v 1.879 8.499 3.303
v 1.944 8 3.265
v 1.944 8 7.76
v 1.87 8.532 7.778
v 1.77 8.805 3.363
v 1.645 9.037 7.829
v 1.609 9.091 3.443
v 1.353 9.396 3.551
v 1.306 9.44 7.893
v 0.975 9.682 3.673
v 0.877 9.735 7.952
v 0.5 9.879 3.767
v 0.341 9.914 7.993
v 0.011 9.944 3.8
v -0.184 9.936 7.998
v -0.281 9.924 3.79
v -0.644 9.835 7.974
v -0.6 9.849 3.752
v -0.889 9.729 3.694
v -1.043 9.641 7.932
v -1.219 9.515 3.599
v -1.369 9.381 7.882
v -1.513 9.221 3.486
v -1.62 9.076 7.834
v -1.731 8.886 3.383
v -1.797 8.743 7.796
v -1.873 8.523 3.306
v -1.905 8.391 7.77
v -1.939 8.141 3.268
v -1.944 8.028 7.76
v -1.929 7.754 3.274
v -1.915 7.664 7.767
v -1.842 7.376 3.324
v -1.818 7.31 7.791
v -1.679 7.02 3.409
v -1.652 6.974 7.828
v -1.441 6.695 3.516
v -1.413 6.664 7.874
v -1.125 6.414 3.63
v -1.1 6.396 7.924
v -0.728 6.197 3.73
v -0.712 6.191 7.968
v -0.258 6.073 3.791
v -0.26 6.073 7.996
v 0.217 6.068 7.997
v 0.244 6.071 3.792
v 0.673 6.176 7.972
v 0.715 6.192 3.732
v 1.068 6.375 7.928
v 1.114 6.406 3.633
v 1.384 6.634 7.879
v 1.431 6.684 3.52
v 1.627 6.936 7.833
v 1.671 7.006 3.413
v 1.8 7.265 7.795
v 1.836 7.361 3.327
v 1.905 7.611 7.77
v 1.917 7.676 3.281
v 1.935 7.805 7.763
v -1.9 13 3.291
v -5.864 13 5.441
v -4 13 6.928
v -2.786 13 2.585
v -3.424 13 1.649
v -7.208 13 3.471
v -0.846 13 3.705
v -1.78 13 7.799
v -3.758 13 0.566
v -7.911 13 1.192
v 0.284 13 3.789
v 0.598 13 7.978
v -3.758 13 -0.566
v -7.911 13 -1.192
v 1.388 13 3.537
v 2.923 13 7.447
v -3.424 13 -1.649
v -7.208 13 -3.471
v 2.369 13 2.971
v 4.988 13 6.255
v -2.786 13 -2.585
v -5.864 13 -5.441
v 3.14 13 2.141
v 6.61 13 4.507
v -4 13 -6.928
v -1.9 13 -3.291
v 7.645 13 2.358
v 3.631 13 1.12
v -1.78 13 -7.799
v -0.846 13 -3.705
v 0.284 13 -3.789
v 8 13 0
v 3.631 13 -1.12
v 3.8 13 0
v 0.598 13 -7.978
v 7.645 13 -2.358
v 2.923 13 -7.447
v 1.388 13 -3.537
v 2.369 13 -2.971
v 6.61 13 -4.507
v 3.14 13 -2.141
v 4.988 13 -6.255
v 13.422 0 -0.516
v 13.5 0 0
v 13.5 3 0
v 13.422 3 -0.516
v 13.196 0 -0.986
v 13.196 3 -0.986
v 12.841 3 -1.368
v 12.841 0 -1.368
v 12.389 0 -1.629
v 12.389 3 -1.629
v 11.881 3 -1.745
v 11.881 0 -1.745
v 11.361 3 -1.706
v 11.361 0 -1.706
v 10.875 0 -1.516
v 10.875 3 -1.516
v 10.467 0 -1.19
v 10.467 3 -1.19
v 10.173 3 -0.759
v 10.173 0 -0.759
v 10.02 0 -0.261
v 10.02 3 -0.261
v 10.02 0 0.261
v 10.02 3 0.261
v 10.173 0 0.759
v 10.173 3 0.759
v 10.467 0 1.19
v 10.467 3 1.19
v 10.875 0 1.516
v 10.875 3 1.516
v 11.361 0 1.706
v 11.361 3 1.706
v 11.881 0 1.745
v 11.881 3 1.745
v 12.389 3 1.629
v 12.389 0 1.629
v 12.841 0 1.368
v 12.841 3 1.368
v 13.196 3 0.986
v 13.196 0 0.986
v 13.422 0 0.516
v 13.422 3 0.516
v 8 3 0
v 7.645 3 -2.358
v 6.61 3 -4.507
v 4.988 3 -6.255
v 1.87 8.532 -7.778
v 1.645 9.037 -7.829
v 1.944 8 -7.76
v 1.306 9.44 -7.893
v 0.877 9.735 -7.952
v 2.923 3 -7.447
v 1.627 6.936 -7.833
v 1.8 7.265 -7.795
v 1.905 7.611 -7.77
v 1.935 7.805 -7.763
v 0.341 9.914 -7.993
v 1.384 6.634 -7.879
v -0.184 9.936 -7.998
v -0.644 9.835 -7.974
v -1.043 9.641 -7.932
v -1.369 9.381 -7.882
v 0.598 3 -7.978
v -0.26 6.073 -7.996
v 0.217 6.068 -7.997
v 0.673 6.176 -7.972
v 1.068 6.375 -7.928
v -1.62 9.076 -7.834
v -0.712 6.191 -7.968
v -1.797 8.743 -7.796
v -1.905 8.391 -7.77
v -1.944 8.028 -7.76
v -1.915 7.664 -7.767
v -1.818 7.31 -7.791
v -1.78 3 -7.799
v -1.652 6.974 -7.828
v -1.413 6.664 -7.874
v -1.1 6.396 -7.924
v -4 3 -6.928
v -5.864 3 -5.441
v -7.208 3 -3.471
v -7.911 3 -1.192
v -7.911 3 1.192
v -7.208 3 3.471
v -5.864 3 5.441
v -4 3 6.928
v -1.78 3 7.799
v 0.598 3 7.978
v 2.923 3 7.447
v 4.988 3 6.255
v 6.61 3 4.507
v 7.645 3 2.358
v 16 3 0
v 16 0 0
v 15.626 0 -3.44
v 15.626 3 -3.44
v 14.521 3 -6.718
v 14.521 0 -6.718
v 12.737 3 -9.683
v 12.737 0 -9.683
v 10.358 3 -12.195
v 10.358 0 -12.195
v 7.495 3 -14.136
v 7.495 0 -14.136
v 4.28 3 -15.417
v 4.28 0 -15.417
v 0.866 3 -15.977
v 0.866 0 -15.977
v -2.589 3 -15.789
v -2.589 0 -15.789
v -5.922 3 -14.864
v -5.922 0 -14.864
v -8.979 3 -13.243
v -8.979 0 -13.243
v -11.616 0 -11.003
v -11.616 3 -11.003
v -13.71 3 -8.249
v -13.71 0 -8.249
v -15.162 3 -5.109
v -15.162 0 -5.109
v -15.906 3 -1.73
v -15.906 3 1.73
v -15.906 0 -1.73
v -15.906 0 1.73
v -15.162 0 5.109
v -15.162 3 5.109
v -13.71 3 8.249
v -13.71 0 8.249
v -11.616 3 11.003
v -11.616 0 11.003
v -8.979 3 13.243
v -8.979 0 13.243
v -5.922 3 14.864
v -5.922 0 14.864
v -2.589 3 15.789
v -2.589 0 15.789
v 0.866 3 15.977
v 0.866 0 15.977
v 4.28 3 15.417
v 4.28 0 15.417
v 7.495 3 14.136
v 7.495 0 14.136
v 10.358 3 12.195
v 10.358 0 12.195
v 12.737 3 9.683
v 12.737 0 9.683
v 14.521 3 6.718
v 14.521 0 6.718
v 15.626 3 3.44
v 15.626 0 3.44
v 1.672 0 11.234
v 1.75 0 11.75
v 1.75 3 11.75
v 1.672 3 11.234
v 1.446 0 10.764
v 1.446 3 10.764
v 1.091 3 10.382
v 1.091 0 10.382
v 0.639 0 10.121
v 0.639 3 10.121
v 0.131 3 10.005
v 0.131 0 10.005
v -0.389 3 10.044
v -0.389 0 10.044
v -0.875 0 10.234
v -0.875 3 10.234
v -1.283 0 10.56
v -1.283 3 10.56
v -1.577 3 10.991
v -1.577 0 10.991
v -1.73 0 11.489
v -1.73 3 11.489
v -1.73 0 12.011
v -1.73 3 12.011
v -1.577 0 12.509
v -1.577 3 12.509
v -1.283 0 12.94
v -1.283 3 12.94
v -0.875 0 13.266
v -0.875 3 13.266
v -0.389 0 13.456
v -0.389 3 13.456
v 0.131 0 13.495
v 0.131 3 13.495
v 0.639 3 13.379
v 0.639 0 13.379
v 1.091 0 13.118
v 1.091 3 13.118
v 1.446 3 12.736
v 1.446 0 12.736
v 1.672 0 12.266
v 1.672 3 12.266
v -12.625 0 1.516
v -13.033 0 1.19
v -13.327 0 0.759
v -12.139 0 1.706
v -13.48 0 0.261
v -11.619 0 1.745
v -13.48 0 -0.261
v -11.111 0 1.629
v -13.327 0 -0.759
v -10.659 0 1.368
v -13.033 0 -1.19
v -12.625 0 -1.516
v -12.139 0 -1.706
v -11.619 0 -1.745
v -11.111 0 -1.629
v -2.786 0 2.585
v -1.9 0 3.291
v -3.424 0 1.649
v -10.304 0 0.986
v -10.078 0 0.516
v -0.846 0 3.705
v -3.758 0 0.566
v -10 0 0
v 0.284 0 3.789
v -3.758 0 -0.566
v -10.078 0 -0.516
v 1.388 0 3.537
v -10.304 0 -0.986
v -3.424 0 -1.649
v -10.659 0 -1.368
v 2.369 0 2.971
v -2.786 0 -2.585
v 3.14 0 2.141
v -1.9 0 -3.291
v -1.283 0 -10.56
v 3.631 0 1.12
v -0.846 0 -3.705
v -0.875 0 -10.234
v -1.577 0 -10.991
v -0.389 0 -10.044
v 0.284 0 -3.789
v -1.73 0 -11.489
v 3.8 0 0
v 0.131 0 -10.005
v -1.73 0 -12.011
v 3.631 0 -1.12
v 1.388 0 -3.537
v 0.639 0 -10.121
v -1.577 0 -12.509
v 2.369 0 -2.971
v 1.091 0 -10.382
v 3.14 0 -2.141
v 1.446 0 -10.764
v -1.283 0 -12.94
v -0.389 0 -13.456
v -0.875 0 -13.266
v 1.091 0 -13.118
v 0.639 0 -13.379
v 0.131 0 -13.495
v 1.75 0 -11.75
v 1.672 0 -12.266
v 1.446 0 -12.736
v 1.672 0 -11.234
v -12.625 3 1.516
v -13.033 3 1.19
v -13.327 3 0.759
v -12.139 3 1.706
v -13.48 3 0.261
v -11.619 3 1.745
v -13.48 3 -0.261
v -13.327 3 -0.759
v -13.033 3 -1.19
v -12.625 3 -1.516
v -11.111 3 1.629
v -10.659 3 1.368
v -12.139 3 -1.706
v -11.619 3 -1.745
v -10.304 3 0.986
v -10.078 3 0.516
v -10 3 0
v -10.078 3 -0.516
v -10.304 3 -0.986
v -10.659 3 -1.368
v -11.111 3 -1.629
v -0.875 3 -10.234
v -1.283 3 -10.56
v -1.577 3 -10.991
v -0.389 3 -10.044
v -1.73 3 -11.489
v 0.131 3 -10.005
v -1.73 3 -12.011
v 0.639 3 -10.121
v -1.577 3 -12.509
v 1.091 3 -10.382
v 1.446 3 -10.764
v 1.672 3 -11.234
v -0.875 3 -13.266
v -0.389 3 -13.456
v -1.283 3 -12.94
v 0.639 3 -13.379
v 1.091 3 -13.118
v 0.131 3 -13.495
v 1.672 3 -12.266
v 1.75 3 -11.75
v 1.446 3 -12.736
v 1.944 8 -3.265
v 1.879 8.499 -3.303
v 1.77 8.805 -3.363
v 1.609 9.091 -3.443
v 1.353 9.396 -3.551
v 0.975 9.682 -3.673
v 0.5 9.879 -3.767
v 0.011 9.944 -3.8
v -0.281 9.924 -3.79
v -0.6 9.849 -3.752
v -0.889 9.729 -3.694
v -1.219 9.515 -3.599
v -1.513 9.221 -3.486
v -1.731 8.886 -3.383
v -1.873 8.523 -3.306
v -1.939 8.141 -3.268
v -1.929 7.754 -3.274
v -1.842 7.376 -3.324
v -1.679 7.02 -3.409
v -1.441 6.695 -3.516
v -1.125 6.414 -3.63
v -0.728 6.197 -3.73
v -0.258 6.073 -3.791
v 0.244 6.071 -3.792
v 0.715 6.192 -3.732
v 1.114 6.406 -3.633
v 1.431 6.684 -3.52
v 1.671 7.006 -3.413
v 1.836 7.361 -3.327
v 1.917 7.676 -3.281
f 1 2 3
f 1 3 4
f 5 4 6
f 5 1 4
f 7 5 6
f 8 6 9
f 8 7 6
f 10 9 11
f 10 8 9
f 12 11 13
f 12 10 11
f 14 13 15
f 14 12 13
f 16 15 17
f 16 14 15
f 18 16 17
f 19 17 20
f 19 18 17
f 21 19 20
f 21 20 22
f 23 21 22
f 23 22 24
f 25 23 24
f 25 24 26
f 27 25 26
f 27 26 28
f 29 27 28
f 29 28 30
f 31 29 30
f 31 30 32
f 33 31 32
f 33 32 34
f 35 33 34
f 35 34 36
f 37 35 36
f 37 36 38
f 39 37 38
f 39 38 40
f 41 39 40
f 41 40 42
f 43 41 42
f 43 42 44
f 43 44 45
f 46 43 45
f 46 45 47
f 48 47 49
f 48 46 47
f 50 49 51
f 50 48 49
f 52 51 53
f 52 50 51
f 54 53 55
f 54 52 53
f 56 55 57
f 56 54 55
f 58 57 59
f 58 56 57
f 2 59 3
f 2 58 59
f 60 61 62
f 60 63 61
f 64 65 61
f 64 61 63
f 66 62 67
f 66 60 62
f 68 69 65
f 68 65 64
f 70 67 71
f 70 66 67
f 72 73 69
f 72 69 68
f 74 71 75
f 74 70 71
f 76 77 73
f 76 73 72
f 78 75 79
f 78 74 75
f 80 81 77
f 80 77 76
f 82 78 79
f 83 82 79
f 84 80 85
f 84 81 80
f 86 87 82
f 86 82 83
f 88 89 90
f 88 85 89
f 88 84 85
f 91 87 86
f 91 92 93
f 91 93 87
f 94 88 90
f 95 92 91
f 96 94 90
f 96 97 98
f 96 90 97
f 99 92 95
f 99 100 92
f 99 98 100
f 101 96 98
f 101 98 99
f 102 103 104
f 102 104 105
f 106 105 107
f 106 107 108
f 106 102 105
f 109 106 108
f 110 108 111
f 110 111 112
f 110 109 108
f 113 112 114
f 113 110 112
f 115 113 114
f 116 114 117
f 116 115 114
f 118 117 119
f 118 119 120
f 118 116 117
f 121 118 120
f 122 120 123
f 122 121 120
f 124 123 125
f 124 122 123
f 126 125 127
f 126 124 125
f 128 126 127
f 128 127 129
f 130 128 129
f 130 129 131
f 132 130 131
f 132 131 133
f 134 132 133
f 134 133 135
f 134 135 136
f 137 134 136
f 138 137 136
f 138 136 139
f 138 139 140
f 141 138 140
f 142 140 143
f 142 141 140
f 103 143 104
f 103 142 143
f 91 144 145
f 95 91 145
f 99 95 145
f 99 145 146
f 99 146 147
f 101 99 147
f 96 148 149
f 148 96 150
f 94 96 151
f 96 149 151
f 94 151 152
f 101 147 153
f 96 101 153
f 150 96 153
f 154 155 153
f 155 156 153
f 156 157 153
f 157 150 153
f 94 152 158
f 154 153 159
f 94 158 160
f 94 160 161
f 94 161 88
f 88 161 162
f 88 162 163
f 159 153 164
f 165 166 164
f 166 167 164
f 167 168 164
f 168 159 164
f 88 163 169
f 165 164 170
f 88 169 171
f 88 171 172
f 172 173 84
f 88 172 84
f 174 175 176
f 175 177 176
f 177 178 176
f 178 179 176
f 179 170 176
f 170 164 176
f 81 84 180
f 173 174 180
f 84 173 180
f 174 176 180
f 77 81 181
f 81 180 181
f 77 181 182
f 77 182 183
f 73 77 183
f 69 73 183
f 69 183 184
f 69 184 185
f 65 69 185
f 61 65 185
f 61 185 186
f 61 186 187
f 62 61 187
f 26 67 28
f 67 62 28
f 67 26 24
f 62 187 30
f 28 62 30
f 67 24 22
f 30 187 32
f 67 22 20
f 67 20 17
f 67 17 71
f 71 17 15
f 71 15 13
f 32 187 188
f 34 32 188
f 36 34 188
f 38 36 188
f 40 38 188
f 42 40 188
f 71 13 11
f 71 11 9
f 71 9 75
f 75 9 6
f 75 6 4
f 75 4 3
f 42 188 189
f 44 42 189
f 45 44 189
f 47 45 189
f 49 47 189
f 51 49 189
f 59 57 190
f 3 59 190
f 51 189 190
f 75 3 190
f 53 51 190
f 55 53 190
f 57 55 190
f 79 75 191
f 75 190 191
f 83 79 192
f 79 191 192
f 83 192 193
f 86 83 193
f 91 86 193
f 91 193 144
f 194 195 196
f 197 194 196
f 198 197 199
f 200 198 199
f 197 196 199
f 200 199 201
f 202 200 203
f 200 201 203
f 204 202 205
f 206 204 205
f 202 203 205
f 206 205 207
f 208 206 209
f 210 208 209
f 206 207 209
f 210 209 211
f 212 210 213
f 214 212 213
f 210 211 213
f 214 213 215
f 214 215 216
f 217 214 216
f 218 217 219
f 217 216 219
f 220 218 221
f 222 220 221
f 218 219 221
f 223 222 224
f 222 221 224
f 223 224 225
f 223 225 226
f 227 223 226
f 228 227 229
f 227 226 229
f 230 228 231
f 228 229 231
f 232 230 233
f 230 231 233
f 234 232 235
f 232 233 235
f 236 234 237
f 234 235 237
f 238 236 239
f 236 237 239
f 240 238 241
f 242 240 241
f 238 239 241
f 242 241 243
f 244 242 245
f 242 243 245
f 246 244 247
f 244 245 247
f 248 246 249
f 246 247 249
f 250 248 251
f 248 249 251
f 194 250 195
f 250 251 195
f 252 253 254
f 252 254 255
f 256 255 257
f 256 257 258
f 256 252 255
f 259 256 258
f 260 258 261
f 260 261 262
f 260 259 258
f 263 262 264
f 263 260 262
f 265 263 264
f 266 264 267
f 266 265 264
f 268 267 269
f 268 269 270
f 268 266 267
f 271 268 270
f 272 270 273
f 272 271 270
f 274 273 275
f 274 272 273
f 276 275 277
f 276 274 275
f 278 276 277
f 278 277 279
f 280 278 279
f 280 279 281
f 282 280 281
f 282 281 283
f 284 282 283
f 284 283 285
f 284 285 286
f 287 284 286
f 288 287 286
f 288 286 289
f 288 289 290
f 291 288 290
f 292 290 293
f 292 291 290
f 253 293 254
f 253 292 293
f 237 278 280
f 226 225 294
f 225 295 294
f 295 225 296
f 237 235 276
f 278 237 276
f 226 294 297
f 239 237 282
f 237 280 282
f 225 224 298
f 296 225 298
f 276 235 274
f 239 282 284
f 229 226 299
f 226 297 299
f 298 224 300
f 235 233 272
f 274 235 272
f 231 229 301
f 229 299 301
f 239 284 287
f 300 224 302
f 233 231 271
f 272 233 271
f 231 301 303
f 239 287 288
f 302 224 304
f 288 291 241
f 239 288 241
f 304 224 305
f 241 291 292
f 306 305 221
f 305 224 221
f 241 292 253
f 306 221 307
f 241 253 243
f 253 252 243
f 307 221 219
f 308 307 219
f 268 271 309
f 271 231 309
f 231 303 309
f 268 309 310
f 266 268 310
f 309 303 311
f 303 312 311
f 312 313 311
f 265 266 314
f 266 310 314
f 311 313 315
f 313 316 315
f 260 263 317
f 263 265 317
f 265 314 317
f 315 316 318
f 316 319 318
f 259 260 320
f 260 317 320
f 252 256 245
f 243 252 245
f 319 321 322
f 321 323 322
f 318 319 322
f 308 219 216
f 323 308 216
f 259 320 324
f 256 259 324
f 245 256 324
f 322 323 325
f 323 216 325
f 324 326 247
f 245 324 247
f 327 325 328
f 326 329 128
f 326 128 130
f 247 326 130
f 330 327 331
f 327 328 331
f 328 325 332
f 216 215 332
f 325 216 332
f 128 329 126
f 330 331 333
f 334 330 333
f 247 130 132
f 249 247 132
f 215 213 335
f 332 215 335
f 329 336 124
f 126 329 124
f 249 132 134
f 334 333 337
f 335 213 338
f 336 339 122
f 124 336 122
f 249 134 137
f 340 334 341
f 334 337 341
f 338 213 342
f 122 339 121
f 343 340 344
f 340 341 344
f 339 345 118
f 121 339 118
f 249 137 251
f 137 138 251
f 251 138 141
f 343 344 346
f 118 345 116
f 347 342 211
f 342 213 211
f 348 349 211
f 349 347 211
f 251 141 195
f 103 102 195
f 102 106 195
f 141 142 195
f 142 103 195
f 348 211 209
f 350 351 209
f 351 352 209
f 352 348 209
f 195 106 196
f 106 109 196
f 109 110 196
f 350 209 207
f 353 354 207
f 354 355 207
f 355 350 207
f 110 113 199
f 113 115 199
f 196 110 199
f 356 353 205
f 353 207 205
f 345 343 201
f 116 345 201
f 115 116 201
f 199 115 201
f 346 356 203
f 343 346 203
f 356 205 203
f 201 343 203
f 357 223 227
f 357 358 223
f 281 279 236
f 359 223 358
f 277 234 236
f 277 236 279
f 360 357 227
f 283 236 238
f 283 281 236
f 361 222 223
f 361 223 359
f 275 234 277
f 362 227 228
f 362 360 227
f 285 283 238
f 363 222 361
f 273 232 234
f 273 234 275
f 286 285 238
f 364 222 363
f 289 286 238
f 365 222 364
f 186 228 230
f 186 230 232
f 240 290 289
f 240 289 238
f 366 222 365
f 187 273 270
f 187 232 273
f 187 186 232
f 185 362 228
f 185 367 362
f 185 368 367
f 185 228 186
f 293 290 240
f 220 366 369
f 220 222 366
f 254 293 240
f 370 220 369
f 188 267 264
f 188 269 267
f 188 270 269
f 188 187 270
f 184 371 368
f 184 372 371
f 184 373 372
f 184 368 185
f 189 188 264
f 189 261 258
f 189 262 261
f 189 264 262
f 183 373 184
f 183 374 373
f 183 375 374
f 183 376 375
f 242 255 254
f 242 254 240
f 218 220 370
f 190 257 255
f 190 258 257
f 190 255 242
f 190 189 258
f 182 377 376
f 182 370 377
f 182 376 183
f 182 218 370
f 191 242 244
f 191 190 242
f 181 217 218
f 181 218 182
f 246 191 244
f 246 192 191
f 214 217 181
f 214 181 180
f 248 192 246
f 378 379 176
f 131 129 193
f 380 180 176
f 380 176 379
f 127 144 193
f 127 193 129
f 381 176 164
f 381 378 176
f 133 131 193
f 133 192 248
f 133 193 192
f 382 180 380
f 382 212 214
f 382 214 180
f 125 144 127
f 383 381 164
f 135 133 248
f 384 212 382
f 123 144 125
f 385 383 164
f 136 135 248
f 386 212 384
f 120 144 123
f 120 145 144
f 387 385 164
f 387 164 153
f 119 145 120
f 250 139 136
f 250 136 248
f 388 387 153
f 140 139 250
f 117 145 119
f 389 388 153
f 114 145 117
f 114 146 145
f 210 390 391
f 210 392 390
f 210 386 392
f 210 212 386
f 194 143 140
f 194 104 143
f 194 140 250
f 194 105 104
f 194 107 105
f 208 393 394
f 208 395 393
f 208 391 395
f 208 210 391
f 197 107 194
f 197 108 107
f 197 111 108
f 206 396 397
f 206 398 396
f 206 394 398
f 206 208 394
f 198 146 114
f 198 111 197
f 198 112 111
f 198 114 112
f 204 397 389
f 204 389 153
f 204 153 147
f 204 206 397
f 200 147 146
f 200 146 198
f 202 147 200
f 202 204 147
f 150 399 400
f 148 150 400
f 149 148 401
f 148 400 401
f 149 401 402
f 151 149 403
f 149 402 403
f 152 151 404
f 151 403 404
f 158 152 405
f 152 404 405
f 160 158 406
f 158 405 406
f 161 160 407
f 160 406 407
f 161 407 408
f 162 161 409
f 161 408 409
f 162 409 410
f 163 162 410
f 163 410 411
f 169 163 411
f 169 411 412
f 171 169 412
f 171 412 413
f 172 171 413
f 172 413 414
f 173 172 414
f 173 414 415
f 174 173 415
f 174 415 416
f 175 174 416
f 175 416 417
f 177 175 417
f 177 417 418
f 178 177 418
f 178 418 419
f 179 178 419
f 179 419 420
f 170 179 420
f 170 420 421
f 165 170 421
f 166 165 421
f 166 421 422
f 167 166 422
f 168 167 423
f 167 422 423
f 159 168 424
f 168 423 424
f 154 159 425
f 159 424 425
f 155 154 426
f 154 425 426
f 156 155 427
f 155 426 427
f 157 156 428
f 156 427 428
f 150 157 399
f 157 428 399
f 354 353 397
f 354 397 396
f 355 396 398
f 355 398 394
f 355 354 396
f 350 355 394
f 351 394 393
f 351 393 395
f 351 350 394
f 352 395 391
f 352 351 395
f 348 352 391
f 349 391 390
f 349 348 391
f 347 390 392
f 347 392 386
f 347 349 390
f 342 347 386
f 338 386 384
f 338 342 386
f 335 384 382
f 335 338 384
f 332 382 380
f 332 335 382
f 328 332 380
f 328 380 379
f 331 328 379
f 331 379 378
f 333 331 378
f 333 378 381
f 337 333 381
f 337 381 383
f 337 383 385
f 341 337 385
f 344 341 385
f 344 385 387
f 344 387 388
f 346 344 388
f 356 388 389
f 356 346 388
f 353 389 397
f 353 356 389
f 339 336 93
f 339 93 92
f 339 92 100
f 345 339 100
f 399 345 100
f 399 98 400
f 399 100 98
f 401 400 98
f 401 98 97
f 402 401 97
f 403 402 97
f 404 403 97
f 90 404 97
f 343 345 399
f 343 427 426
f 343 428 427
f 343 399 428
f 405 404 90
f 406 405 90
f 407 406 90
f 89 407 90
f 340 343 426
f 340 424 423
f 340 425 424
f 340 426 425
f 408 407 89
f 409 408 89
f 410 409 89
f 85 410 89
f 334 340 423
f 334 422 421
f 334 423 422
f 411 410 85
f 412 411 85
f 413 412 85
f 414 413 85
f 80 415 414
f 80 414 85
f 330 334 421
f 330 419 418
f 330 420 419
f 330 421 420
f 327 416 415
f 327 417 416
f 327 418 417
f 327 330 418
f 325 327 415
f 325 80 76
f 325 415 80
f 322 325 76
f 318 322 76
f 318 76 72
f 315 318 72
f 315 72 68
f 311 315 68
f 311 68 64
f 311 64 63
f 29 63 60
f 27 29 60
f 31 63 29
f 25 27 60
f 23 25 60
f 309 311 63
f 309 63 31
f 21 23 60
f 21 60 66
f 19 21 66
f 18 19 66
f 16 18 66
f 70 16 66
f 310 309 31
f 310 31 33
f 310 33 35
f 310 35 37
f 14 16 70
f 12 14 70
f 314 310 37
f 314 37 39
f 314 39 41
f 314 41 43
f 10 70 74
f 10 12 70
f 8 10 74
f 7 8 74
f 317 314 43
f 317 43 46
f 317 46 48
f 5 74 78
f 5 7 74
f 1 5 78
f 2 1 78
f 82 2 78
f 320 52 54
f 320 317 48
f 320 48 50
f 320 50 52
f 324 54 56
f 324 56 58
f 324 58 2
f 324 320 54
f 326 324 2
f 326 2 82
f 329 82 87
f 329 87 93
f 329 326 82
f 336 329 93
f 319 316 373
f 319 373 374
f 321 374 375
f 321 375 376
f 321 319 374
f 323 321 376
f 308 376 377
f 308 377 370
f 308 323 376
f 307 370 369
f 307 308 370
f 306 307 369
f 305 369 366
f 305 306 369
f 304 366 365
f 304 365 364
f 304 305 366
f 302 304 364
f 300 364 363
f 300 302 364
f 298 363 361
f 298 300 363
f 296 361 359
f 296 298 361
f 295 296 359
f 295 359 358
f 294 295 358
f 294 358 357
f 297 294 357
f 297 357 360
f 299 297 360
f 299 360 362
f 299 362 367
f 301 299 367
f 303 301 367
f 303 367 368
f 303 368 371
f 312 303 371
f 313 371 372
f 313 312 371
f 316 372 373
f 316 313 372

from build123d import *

# Parameters (mm, degrees)
SKETCH1_R               = 16
SKETCH1_R_2             = 1.75
SKETCH1_R_3             = 8
BOSS_EXTRUDE1_DEPTH     = 3
SKETCH1_3_R             = 8
SKETCH1_3_R_2           = 3.8
BOSS_EXTRUDE2_DEPTH     = 13
SKETCH2_R               = 1.944334414
CUT_EXTRUDE1_DEPTH      = 17
CUT_EXTRUDE1_DEPTH_BACK = 17


with BuildPart() as part:
    # Sketch1 → Boss-Extrude1 (new body)
    with BuildSketch(Plane(origin=(0, 0, 0), x_dir=(1, 0, 0), z_dir=(0, 1, 0))):
        Circle(SKETCH1_R)
        with Locations((-11.75, 0)):
            Circle(SKETCH1_R_2, mode=Mode.SUBTRACT)
        with Locations((0, -11.75)):
            Circle(SKETCH1_R_2, mode=Mode.SUBTRACT)
        with Locations((11.75, 0)):
            Circle(SKETCH1_R_2, mode=Mode.SUBTRACT)
        with Locations((0, 11.75)):
            Circle(SKETCH1_R_2, mode=Mode.SUBTRACT)
        Circle(SKETCH1_R_3, mode=Mode.SUBTRACT)
    extrude(amount=BOSS_EXTRUDE1_DEPTH)

    # Sketch1<3> → Boss-Extrude2 (add)
    with BuildSketch(Plane(origin=(0, 0, 0), x_dir=(1, 0, 0), z_dir=(0, 1, 0))):
        Circle(SKETCH1_3_R)
        Circle(SKETCH1_3_R_2, mode=Mode.SUBTRACT)
    extrude(amount=BOSS_EXTRUDE2_DEPTH)

    # Sketch2 → Cut-Extrude1 (cut, two sides)
    with BuildSketch(Plane.XY) as cut_extrude1_sk:
        with Locations((0, 8)):
            Circle(SKETCH2_R)
    extrude(amount=CUT_EXTRUDE1_DEPTH, mode=Mode.SUBTRACT)
    extrude(cut_extrude1_sk.sketch, amount=-CUT_EXTRUDE1_DEPTH_BACK, mode=Mode.SUBTRACT)


solid = part.part
